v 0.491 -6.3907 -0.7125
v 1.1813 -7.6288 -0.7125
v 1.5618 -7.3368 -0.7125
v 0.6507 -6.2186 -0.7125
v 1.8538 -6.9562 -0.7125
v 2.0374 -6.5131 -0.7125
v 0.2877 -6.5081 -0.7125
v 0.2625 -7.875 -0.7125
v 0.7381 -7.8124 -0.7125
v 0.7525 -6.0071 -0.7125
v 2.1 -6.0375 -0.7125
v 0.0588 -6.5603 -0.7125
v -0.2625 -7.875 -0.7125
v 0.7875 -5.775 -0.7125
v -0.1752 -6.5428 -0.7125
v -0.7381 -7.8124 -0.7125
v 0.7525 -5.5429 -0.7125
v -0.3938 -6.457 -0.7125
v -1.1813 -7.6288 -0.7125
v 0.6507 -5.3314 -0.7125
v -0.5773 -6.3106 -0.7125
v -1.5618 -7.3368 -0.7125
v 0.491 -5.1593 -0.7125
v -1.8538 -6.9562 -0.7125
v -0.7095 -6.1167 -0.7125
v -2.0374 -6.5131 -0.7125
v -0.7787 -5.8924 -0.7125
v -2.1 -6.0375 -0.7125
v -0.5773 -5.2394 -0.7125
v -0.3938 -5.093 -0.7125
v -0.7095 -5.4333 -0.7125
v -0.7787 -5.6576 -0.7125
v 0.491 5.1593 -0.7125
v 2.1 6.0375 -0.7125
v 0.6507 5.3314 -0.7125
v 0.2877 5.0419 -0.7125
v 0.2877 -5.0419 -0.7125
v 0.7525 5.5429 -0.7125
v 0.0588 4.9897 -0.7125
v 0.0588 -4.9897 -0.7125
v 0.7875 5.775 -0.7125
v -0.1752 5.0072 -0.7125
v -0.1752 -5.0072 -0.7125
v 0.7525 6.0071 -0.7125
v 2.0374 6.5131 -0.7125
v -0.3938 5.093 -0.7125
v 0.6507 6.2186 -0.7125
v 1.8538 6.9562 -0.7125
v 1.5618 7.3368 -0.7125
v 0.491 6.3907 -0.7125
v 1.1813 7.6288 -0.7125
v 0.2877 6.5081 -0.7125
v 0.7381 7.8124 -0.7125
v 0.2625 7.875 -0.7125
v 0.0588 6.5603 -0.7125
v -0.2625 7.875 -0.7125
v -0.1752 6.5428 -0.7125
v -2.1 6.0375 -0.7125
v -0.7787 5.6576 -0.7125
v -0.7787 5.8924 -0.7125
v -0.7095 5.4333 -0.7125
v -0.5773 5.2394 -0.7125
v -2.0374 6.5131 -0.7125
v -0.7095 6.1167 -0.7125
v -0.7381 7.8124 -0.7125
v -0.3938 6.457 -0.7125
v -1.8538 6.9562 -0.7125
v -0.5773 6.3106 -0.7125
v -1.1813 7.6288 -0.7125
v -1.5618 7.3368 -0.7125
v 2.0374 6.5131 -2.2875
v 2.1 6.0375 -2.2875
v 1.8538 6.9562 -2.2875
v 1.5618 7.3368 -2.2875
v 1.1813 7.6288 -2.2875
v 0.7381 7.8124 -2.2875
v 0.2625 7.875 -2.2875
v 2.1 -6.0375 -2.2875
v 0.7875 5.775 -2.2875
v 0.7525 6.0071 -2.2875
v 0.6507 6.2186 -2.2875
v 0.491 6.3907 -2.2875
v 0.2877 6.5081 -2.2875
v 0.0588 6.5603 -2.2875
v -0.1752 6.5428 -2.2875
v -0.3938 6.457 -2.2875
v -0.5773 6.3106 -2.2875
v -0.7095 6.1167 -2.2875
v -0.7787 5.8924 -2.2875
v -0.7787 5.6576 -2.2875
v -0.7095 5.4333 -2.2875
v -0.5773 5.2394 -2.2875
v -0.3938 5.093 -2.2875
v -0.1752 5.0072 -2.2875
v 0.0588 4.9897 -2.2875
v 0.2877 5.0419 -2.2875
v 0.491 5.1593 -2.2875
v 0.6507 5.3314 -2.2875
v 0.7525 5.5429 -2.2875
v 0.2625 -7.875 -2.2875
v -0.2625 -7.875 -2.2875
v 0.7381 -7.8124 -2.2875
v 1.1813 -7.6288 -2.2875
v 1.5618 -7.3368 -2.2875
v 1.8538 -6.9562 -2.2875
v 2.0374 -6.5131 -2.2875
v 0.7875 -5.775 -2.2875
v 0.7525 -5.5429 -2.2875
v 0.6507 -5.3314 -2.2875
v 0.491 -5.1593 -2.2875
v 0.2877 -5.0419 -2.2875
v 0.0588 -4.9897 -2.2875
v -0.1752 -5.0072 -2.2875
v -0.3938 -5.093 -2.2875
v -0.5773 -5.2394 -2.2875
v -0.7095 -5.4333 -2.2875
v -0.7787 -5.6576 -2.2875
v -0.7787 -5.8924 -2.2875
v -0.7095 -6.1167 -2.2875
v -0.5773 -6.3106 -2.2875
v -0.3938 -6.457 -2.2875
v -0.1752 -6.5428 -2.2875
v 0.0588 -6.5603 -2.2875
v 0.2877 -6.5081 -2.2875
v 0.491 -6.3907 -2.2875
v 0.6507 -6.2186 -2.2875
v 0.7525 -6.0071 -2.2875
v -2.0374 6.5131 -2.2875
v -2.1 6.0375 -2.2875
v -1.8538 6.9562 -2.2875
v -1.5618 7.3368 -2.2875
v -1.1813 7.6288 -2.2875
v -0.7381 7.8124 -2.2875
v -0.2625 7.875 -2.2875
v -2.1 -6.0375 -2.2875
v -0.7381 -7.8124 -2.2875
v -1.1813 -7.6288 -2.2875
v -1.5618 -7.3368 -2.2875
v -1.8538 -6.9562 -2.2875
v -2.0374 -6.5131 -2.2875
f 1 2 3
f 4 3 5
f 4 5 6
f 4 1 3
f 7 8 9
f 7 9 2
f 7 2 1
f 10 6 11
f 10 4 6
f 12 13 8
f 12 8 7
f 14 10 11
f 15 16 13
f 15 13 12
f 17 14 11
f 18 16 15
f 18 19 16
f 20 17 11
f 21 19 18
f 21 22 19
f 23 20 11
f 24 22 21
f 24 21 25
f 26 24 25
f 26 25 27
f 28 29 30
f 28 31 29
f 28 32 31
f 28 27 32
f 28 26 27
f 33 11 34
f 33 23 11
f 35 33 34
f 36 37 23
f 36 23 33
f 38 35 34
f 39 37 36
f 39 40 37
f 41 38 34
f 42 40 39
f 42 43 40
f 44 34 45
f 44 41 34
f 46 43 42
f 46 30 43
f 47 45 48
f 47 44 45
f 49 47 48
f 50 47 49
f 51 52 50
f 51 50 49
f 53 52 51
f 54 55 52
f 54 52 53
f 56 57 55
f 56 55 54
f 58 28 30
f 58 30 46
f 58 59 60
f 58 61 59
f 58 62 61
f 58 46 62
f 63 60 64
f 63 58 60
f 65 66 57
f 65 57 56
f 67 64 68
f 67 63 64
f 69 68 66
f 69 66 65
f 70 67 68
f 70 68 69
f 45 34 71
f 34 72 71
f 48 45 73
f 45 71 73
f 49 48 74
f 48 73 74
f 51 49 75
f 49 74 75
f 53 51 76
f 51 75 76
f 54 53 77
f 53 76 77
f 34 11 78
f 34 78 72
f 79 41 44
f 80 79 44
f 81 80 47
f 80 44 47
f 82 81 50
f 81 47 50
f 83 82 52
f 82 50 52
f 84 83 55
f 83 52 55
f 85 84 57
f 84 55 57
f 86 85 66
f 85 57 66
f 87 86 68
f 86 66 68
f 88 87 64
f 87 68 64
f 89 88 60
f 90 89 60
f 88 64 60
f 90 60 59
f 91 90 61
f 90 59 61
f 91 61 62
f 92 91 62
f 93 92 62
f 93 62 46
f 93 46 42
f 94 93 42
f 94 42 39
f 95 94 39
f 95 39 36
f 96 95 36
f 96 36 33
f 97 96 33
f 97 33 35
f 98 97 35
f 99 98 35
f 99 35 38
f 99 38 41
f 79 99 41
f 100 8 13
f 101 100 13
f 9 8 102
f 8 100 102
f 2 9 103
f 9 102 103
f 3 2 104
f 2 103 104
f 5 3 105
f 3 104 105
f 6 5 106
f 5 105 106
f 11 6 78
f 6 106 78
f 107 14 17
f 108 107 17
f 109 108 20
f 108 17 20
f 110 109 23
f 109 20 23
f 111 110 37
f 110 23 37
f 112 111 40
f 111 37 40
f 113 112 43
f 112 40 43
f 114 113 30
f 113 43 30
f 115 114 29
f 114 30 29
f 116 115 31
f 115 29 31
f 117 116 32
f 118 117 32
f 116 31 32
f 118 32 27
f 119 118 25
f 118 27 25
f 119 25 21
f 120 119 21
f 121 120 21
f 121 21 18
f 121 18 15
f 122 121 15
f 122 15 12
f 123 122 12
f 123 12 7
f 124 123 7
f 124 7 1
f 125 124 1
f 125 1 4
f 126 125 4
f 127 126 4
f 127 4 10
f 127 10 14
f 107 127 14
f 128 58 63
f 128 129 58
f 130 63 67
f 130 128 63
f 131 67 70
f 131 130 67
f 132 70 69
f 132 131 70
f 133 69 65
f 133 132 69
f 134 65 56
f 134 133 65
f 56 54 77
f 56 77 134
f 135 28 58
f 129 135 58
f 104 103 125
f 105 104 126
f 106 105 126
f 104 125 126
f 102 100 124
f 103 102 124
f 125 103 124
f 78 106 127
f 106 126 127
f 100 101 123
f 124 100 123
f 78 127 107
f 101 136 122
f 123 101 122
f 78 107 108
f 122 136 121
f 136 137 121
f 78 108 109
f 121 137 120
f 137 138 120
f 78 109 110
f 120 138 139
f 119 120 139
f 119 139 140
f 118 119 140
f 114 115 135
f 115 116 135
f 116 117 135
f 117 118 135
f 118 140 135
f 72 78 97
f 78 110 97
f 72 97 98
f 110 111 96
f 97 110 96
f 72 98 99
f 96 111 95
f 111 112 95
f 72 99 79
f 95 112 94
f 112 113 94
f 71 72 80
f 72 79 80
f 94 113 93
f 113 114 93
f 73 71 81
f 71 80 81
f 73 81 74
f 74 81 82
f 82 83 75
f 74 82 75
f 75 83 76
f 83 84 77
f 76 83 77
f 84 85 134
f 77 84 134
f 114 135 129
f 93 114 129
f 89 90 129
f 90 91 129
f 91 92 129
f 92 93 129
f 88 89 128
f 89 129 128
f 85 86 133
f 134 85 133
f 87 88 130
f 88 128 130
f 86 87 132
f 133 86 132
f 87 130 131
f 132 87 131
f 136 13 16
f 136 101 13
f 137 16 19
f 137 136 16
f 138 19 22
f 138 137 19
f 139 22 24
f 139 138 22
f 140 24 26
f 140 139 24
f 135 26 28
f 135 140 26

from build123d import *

# Parameters (mm, degrees)
SKETCH1_W           = 30
SKETCH1_H           = 8
BOSS_EXTRUDE1_DEPTH = 3
SKETCH2_R           = 1.5
CUT_EXTRUDE1_DEPTH  = 4
FILLET1_R           = 3.5
SCALE1_SCALE        = 0.75
SCALE2_SCALE        = 0.7


with BuildPart() as part:
    # Sketch1 → Boss-Extrude1 (new body)
    with BuildSketch(Plane(origin=(0, 0, 0), x_dir=(0, 1, 0), z_dir=(0, 0, 1))):
        Rectangle(SKETCH1_W, SKETCH1_H)
    extrude(amount=-BOSS_EXTRUDE1_DEPTH)

    # Sketch2 → Cut-Extrude1 (cut)
    with BuildSketch(Plane.XY):
        with Locations((0, 11)):
            Circle(SKETCH2_R)
        with Locations((0, -11)):
            Circle(SKETCH2_R)
    extrude(amount=-CUT_EXTRUDE1_DEPTH, mode=Mode.SUBTRACT)

    # Fillet1
    fillet1_edges = [part.edges().sort_by_distance(p)[0] for p in [
        (4, 15, -1.5),
        (4, -15, -1.5),
        (-4, -15, -1.5),
        (-4, 15, -1.5),
    ]]
    fillet(fillet1_edges, radius=FILLET1_R)


with BuildPart() as part_1:
    # Scale1: scaled about (0, 0, -1.5)
    add(part.part.scale(SCALE1_SCALE).moved(Location((0, 0, -0.375))))


with BuildPart() as part_2:
    # Scale2: scaled about (0, 0, -1.5)
    add(part_1.part.scale(SCALE2_SCALE).moved(Location((0, 0, -0.45))))


solid = part_2.part
